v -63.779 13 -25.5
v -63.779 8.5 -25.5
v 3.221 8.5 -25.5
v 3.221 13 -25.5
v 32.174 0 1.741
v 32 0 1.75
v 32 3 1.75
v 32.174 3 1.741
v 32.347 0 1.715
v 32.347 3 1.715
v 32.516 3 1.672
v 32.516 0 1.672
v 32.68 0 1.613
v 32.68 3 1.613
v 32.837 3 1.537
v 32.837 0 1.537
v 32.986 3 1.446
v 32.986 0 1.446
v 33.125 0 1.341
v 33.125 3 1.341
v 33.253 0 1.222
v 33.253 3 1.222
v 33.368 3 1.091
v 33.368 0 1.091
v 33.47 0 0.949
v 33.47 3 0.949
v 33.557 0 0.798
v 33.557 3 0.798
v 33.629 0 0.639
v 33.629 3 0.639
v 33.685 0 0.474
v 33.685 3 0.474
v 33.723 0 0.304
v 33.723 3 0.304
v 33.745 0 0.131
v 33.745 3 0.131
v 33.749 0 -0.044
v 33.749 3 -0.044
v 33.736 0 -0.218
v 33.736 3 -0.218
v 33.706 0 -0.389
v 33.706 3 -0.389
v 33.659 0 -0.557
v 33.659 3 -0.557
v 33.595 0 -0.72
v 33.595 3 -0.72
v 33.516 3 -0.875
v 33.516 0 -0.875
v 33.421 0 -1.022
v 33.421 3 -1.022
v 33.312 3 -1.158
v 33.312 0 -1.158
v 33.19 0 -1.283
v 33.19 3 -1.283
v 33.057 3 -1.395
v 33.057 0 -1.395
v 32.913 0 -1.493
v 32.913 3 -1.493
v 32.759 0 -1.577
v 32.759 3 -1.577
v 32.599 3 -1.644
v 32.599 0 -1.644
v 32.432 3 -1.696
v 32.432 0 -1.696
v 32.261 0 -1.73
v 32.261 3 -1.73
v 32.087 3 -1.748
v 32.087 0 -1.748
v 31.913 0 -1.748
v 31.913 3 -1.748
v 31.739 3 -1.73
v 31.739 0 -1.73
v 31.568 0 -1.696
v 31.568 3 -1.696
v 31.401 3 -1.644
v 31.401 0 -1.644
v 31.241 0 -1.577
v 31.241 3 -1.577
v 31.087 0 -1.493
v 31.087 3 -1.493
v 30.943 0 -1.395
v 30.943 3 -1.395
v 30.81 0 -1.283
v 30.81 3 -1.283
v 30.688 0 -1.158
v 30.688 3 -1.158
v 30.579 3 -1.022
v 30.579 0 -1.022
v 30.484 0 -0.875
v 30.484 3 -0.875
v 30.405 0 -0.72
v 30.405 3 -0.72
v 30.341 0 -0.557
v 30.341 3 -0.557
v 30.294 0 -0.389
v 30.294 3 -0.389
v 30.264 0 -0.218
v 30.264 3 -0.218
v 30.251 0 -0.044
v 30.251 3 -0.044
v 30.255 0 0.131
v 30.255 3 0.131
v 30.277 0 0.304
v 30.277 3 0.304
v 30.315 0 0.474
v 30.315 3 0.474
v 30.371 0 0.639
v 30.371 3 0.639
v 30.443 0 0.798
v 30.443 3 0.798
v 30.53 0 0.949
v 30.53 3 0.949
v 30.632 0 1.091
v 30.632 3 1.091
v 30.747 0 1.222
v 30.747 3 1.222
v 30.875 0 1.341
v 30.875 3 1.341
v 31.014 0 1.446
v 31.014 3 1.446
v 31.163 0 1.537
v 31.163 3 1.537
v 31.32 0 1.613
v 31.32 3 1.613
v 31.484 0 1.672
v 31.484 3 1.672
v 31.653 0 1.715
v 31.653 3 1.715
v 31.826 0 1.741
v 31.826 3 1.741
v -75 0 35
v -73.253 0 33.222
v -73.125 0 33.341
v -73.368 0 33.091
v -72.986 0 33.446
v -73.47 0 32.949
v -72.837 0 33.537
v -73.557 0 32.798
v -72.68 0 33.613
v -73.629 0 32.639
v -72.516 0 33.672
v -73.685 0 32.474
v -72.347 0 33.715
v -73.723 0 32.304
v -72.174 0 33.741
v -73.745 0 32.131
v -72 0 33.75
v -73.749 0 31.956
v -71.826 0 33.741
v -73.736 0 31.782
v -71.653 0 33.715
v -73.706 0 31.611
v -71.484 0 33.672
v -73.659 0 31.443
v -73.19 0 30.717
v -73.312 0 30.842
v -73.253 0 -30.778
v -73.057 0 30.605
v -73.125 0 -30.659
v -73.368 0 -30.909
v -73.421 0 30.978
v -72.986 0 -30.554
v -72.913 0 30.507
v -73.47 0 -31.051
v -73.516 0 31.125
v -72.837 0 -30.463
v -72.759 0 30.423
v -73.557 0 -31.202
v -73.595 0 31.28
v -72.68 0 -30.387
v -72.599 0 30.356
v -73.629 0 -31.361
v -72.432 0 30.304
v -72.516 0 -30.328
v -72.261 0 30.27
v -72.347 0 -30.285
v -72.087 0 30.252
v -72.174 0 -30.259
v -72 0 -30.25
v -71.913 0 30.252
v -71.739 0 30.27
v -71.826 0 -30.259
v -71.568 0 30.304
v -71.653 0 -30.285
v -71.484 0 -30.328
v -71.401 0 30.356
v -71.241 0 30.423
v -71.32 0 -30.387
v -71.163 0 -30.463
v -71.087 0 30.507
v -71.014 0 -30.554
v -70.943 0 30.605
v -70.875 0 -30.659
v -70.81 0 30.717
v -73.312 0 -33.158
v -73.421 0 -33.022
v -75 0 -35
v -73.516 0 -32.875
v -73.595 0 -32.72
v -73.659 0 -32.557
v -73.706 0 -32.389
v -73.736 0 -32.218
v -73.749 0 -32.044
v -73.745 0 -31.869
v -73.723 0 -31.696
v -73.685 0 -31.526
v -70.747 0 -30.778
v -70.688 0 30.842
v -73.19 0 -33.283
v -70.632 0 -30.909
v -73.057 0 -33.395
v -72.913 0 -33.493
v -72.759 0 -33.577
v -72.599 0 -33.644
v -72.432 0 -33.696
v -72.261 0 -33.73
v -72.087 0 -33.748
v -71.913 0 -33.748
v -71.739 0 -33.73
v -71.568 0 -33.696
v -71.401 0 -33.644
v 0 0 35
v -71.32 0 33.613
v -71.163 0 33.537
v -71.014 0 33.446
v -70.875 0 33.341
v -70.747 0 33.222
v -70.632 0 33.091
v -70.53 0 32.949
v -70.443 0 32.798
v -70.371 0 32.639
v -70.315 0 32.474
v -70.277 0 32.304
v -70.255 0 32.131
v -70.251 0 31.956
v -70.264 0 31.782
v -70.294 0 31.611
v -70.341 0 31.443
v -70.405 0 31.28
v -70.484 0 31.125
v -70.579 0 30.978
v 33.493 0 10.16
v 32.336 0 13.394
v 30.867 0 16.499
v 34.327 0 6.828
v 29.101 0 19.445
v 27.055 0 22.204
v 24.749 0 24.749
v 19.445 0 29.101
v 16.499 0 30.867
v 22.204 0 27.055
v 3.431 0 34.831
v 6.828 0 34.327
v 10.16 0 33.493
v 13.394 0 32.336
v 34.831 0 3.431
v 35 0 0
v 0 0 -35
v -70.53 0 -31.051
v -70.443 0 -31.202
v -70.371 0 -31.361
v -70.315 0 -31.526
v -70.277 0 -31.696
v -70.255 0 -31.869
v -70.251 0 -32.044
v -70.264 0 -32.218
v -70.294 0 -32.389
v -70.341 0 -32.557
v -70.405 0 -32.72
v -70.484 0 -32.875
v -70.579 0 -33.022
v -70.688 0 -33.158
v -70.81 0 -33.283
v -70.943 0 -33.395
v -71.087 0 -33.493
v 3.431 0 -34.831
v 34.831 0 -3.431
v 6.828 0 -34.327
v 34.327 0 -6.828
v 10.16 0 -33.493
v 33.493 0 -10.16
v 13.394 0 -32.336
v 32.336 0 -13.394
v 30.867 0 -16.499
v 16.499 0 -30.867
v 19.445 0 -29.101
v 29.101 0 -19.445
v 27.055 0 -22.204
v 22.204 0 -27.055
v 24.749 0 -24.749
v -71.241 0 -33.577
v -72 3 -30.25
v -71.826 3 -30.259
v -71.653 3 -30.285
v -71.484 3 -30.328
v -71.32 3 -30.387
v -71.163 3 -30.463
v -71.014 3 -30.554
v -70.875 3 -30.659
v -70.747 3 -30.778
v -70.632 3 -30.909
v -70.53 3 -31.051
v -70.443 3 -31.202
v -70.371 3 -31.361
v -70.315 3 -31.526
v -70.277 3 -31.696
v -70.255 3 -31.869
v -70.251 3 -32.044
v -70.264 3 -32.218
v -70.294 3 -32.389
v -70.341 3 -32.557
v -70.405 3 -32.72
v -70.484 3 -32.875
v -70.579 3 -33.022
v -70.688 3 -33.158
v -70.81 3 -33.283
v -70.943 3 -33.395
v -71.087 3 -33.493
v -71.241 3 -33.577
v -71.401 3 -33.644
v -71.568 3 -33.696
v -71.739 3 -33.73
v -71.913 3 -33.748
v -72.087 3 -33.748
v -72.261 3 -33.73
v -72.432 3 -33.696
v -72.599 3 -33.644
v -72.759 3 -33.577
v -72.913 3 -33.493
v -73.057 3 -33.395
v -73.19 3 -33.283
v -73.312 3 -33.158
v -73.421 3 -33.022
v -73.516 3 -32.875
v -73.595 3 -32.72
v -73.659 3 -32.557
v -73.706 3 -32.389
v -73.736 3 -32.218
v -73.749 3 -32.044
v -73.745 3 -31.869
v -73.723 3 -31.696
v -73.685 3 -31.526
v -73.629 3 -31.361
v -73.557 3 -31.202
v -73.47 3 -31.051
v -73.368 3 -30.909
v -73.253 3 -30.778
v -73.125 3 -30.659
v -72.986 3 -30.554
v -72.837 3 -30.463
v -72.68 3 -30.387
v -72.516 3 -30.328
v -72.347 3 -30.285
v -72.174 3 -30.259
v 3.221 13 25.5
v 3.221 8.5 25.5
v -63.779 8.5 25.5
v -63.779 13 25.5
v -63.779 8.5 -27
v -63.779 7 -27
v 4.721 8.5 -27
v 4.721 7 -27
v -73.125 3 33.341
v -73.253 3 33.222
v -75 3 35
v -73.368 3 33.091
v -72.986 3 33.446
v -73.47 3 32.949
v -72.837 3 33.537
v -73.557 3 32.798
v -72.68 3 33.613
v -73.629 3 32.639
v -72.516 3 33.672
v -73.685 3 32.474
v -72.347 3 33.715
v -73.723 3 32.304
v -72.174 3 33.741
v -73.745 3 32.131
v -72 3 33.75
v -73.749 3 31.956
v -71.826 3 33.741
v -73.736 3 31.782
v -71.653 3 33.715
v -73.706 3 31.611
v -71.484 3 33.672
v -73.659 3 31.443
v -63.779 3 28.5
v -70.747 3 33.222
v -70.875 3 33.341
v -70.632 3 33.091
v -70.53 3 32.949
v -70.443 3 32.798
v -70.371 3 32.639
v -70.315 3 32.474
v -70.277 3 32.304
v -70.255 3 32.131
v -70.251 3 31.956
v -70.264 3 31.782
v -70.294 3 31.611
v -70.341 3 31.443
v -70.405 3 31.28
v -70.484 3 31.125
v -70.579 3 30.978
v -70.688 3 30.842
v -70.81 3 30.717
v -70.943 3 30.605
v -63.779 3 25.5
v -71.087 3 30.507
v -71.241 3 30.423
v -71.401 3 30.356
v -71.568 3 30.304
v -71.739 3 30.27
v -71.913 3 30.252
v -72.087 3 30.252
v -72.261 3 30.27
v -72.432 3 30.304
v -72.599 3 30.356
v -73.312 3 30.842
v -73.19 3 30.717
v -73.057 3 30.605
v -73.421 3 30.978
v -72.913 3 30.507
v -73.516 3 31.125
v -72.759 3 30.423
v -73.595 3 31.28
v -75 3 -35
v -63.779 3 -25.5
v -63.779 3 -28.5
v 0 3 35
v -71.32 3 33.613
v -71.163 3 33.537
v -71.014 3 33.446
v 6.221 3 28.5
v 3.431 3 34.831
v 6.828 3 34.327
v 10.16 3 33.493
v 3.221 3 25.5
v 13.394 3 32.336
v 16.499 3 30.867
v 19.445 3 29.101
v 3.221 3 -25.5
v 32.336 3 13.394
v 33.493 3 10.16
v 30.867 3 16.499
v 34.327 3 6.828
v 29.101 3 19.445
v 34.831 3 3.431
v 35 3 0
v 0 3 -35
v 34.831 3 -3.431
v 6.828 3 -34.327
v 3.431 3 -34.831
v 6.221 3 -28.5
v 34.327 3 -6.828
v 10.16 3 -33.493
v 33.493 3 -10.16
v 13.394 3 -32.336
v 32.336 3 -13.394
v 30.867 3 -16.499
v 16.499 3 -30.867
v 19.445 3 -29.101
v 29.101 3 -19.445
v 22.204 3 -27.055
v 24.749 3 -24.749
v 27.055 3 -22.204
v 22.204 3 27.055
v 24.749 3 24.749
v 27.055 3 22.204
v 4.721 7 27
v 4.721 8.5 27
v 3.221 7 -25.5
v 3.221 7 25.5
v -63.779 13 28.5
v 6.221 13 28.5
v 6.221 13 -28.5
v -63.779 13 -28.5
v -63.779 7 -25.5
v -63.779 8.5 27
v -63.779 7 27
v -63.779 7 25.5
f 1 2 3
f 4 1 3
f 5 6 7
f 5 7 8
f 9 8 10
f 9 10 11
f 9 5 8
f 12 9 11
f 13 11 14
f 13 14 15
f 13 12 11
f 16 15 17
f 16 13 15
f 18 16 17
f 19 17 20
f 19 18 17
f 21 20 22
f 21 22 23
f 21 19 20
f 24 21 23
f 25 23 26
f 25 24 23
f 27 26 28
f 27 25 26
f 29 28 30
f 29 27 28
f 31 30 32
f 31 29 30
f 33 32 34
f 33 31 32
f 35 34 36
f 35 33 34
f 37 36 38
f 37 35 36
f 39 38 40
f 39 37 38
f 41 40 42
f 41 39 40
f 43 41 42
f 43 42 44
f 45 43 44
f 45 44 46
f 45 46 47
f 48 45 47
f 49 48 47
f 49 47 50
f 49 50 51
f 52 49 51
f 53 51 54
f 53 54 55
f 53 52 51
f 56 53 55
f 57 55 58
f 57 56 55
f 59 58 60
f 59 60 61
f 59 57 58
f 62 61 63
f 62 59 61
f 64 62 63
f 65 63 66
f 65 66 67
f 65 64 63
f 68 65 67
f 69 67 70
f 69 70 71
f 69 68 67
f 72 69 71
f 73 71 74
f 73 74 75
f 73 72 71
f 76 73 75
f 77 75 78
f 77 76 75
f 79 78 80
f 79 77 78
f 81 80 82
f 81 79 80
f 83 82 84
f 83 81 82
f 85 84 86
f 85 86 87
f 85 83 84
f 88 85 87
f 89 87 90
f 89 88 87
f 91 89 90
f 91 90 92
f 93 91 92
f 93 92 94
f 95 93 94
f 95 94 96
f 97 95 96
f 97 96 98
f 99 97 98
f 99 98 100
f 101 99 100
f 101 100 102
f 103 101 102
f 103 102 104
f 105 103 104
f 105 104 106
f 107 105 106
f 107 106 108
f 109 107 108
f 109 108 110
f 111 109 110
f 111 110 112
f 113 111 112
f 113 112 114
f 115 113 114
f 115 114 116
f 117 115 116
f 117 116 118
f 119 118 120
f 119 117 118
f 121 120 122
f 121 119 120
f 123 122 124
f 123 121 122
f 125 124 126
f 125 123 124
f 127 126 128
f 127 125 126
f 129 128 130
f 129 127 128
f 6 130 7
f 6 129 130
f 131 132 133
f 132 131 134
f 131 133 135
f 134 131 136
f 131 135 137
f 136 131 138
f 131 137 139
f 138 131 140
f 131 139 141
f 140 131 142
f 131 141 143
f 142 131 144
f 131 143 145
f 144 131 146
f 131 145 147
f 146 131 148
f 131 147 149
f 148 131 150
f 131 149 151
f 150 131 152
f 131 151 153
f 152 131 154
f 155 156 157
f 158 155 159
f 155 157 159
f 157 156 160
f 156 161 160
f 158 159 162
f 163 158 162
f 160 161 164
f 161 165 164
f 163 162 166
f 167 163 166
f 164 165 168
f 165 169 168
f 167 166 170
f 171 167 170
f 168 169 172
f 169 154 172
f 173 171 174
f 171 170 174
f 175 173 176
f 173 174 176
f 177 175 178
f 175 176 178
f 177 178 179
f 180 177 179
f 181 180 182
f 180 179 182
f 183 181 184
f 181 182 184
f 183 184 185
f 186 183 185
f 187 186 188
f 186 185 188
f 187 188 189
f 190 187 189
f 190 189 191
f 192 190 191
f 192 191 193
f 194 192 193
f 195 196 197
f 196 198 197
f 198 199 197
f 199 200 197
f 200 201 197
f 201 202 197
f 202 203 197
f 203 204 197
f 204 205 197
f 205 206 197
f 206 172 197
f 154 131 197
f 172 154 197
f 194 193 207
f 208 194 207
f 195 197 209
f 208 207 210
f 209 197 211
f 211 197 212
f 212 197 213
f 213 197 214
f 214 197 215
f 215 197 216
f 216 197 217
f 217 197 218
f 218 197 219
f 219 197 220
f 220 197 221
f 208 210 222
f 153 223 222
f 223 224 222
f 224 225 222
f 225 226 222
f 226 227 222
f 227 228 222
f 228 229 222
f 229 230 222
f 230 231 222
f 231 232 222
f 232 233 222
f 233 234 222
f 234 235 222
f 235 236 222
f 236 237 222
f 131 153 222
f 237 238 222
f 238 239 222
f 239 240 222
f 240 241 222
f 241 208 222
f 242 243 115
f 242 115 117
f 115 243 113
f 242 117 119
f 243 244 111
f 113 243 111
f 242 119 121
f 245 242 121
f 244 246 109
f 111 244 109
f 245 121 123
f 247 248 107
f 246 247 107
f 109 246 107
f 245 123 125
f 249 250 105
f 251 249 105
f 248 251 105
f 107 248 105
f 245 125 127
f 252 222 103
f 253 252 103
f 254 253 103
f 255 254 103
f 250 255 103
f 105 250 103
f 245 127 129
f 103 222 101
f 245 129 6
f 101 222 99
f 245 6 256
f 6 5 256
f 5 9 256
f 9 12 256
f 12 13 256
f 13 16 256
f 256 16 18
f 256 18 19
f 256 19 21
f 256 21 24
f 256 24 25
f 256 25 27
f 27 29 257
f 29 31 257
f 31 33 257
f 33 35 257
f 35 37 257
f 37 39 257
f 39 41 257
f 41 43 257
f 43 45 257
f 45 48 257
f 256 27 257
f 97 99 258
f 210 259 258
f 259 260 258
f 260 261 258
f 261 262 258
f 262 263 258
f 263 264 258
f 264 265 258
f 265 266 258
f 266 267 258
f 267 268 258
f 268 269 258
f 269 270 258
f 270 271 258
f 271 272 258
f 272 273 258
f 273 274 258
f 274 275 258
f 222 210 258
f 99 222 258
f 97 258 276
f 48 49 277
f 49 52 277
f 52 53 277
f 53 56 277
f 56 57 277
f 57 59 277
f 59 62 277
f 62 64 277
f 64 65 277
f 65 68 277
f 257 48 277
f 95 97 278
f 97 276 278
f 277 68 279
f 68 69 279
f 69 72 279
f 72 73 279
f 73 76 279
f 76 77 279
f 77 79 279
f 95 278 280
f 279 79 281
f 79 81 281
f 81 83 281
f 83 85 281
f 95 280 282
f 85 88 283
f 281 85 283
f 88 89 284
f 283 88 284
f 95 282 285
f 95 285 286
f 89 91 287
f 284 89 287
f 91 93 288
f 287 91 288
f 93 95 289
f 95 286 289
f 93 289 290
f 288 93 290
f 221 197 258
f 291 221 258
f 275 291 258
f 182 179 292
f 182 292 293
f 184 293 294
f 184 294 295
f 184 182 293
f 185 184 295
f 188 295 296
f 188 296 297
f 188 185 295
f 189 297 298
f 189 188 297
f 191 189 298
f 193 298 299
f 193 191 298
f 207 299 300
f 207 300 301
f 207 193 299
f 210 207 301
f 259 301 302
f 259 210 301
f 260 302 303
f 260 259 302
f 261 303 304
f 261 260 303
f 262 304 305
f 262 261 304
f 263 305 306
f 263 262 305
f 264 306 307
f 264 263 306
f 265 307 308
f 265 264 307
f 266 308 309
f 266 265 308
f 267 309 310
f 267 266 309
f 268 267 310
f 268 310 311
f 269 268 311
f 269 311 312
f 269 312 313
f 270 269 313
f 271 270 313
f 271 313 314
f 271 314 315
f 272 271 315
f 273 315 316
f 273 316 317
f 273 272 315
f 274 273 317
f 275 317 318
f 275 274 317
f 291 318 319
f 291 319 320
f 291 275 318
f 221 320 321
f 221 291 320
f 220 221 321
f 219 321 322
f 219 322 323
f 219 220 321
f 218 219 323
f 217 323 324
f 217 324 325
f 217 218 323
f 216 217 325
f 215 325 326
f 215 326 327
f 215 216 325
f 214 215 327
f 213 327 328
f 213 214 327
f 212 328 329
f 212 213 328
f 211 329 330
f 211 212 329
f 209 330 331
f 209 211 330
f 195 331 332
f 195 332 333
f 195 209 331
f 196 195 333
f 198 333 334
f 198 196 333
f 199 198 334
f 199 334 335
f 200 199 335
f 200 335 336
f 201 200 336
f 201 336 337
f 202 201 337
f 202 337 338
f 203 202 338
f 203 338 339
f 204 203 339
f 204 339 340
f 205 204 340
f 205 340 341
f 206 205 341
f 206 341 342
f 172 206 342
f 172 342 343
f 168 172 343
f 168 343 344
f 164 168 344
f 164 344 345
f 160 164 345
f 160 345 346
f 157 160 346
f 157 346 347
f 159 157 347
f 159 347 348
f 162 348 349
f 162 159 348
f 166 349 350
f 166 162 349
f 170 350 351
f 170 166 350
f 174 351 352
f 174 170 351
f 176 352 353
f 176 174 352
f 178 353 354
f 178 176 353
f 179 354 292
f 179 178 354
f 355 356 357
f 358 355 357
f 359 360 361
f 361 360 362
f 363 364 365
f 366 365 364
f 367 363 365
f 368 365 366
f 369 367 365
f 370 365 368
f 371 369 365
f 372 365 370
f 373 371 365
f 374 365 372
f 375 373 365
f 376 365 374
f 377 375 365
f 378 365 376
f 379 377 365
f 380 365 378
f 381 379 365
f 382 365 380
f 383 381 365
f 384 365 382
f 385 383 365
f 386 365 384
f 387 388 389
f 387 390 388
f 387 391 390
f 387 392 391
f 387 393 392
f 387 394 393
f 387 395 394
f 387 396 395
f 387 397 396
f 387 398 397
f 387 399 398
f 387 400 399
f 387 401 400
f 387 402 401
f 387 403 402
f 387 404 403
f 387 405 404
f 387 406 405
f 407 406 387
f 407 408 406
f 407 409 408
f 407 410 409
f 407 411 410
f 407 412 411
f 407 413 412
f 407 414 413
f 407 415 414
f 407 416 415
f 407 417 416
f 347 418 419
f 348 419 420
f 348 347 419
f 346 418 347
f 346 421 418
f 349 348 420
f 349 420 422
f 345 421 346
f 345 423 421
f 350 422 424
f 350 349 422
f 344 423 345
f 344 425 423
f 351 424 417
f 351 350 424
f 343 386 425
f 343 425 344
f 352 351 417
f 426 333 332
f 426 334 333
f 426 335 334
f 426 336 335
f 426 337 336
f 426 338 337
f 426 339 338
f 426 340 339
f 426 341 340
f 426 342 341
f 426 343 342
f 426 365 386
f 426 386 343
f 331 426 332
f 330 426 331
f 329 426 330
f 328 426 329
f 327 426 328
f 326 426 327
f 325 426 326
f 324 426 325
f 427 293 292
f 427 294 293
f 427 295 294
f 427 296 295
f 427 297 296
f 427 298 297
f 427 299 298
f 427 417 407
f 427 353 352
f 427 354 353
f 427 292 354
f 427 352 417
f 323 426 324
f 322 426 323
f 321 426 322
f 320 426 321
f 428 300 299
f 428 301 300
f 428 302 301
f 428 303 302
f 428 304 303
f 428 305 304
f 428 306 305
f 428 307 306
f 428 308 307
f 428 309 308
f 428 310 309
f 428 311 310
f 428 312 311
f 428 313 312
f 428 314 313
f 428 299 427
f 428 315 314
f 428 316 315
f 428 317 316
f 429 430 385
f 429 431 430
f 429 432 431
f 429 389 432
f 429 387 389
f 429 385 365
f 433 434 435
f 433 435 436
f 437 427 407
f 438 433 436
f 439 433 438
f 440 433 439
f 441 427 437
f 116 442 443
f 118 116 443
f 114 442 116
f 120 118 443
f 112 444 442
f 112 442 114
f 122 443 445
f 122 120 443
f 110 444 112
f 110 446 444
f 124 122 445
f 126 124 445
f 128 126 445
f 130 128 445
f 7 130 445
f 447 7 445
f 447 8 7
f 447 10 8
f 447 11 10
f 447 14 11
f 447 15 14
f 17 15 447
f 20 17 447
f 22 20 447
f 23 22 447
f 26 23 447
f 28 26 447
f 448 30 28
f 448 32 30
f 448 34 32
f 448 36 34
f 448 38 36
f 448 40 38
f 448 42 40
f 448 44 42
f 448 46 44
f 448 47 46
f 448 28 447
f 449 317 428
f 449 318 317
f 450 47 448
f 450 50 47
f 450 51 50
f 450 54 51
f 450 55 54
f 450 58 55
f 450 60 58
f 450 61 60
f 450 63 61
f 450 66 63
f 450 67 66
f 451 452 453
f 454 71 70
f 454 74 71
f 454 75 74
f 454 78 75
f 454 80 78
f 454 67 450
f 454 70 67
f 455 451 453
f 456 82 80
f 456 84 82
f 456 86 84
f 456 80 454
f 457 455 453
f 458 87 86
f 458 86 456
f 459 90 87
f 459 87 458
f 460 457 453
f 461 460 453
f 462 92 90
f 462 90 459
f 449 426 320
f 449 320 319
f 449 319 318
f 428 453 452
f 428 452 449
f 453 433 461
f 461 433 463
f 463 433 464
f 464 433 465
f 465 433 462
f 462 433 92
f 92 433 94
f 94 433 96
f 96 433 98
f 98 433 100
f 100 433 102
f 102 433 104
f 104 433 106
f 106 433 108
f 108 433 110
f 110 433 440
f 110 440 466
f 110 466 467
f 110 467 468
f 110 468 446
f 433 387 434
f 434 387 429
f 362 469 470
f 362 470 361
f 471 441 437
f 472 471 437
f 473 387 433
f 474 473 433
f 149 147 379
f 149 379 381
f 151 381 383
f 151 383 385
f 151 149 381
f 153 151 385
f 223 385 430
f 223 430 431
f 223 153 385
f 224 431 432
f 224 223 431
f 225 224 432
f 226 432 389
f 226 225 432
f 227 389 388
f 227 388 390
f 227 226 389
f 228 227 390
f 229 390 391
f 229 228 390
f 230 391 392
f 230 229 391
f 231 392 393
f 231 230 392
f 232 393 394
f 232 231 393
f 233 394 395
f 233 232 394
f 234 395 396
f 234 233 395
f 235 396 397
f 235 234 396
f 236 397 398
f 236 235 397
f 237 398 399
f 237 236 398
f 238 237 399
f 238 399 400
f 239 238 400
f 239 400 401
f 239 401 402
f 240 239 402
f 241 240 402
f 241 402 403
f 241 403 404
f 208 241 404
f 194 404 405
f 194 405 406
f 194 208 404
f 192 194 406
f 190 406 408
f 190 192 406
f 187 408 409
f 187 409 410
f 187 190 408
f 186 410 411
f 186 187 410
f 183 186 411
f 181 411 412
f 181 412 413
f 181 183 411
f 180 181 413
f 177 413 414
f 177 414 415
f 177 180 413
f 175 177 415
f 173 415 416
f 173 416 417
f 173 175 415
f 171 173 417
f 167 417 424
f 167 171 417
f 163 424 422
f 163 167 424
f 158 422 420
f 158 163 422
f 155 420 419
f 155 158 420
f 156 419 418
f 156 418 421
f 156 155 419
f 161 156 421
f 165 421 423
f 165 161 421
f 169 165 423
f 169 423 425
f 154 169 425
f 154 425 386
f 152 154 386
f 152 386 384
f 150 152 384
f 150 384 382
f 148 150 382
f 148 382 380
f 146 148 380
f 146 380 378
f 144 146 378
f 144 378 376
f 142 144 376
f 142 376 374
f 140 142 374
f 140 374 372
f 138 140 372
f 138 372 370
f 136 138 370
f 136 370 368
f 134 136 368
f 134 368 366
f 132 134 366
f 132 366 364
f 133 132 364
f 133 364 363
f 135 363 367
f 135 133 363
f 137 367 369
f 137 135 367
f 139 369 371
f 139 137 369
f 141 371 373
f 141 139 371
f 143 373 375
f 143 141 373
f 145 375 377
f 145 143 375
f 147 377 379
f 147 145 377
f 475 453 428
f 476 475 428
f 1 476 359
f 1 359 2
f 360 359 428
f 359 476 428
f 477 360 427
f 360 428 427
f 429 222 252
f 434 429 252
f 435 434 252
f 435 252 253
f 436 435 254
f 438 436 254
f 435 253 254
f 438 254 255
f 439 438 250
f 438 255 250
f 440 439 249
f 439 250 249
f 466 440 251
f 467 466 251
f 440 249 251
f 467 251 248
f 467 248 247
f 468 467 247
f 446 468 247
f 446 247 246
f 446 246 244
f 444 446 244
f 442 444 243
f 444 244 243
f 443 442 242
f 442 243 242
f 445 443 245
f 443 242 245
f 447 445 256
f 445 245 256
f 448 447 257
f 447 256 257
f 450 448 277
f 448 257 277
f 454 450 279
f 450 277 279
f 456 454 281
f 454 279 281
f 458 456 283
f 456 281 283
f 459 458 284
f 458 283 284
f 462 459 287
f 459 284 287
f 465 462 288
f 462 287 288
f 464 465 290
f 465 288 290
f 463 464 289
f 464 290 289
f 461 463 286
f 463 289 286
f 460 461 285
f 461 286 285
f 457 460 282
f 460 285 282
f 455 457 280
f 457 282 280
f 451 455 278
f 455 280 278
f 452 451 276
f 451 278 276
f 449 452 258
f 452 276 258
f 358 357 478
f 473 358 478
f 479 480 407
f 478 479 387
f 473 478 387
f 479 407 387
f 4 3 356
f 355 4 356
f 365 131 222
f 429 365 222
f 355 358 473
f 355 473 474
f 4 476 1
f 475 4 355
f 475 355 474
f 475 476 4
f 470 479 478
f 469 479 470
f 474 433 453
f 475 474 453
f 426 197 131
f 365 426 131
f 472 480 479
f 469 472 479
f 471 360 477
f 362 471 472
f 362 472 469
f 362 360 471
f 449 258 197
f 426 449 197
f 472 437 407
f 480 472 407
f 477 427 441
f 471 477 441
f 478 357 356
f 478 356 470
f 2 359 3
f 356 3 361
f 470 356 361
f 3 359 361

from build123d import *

# Parameters (mm, degrees)
CROQUIS1_R              = 1.75
SALIENTE_EXTRUIR1_DEPTH = 3
SALIENTE_EXTRUIR3_DEPTH = 10
CROQUIS4_W              = 70.682064062
CROQUIS4_H              = 54
CORTAR_EXTRUIR1_DEPTH   = 1.5


with BuildPart() as part:
    # Croquis1 → Saliente-Extruir1 (new body)
    with BuildSketch(Plane(origin=(0, 0, 0), x_dir=(1, 0, 0), z_dir=(0, 1, 0))):
        with BuildLine():
            Line((0, 35), (-75, 35))
            Line((-75, 35), (-75, -35))
            Line((-75, -35), (0, -35))
            ThreePointArc((0, -35), (35, 0), (0, 35))
        make_face()
        with Locations(Location((-72, 32, 0), (0, 0, 270))):
            Circle(CROQUIS1_R, mode=Mode.SUBTRACT)
        with Locations(Location((-72, -32, 0), (0, 0, 270))):
            Circle(CROQUIS1_R, mode=Mode.SUBTRACT)
        with Locations(Location((32, 0, 0), (0, 0, 270))):
            Circle(CROQUIS1_R, mode=Mode.SUBTRACT)
    extrude(amount=SALIENTE_EXTRUIR1_DEPTH)

    # Croquis3 → Saliente-Extruir3 (add)
    with BuildSketch(Plane(origin=(0, 3, 0), x_dir=(1, 0, 0), z_dir=(0, 1, 0))):
        Polygon((6.22052857, 28.5), (-63.77947143, 28.5), (-63.77947143, 25.5), (3.22052857, 25.5), (3.22052857, -25.5), (-63.77947143, -25.5), (-63.77947143, -28.5), (6.22052857, -28.5), align=None)
    extrude(amount=SALIENTE_EXTRUIR3_DEPTH)

    # Croquis4 → Cortar-Extruir1 (cut)
    with BuildSketch(Plane(origin=(0, 7, 0), x_dir=(1, 0, 0), z_dir=(0, 1, 0))):
        with Locations((-30.620503461, 0)):
            Rectangle(CROQUIS4_W, CROQUIS4_H)
    extrude(amount=CORTAR_EXTRUIR1_DEPTH, mode=Mode.SUBTRACT)


solid = part.part
